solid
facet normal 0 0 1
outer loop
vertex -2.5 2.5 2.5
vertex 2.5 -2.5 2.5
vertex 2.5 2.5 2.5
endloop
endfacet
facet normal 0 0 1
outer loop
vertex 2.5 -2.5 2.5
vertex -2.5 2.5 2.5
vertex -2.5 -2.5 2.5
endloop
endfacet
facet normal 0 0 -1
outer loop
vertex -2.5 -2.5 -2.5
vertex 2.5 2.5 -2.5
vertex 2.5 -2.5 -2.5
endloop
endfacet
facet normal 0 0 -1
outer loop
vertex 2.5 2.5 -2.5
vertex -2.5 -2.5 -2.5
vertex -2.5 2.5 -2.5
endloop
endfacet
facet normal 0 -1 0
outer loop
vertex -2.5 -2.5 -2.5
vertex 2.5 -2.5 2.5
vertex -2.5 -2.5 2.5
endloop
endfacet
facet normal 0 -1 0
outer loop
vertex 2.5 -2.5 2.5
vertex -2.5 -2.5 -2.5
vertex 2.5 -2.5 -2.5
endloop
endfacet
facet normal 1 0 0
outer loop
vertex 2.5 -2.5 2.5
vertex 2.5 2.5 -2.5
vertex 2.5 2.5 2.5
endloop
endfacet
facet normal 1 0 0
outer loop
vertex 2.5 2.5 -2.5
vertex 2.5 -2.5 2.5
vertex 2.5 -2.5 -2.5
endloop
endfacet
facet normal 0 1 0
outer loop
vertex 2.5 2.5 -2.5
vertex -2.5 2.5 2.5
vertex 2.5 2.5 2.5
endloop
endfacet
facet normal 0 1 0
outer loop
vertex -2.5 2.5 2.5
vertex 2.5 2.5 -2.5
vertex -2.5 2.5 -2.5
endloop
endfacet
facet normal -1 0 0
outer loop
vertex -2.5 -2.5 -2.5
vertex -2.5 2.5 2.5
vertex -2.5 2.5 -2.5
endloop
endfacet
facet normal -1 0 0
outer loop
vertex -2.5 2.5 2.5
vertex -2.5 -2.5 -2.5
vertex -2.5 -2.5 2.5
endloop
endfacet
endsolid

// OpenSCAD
/*
 * OpenSCAD Workshop Examples
 * Copyright (c) 2013-2016 Anar Software LLC. < http://anars.com >
 *
 * This program is free software: you can redistribute it and/or modify it under
 * the terms of the GNU General Public License as published by the Free Software
 * Foundation, either version 3 of the License, or (at your option) any later
 * version.
 *
 * This program is distributed in the hope that it will be useful, but WITHOUT
 * ANY WARRANTY; without even the implied warranty of MERCHANTABILITY or FITNESS
 * FOR A PARTICULAR PURPOSE. See the GNU General Public License for more details.
 *
 * You should have received a copy of the GNU General Public License along with
 * this program. If not, see < http://www.gnu.org/licenses/ >
 *
 */
/*

Creates a cube with sides of that 5 unit length and it is is centered at (0,0,0).

Parameters :

	cube(size = x, center = boolean);

*/

cube(size = 5, center = true);
